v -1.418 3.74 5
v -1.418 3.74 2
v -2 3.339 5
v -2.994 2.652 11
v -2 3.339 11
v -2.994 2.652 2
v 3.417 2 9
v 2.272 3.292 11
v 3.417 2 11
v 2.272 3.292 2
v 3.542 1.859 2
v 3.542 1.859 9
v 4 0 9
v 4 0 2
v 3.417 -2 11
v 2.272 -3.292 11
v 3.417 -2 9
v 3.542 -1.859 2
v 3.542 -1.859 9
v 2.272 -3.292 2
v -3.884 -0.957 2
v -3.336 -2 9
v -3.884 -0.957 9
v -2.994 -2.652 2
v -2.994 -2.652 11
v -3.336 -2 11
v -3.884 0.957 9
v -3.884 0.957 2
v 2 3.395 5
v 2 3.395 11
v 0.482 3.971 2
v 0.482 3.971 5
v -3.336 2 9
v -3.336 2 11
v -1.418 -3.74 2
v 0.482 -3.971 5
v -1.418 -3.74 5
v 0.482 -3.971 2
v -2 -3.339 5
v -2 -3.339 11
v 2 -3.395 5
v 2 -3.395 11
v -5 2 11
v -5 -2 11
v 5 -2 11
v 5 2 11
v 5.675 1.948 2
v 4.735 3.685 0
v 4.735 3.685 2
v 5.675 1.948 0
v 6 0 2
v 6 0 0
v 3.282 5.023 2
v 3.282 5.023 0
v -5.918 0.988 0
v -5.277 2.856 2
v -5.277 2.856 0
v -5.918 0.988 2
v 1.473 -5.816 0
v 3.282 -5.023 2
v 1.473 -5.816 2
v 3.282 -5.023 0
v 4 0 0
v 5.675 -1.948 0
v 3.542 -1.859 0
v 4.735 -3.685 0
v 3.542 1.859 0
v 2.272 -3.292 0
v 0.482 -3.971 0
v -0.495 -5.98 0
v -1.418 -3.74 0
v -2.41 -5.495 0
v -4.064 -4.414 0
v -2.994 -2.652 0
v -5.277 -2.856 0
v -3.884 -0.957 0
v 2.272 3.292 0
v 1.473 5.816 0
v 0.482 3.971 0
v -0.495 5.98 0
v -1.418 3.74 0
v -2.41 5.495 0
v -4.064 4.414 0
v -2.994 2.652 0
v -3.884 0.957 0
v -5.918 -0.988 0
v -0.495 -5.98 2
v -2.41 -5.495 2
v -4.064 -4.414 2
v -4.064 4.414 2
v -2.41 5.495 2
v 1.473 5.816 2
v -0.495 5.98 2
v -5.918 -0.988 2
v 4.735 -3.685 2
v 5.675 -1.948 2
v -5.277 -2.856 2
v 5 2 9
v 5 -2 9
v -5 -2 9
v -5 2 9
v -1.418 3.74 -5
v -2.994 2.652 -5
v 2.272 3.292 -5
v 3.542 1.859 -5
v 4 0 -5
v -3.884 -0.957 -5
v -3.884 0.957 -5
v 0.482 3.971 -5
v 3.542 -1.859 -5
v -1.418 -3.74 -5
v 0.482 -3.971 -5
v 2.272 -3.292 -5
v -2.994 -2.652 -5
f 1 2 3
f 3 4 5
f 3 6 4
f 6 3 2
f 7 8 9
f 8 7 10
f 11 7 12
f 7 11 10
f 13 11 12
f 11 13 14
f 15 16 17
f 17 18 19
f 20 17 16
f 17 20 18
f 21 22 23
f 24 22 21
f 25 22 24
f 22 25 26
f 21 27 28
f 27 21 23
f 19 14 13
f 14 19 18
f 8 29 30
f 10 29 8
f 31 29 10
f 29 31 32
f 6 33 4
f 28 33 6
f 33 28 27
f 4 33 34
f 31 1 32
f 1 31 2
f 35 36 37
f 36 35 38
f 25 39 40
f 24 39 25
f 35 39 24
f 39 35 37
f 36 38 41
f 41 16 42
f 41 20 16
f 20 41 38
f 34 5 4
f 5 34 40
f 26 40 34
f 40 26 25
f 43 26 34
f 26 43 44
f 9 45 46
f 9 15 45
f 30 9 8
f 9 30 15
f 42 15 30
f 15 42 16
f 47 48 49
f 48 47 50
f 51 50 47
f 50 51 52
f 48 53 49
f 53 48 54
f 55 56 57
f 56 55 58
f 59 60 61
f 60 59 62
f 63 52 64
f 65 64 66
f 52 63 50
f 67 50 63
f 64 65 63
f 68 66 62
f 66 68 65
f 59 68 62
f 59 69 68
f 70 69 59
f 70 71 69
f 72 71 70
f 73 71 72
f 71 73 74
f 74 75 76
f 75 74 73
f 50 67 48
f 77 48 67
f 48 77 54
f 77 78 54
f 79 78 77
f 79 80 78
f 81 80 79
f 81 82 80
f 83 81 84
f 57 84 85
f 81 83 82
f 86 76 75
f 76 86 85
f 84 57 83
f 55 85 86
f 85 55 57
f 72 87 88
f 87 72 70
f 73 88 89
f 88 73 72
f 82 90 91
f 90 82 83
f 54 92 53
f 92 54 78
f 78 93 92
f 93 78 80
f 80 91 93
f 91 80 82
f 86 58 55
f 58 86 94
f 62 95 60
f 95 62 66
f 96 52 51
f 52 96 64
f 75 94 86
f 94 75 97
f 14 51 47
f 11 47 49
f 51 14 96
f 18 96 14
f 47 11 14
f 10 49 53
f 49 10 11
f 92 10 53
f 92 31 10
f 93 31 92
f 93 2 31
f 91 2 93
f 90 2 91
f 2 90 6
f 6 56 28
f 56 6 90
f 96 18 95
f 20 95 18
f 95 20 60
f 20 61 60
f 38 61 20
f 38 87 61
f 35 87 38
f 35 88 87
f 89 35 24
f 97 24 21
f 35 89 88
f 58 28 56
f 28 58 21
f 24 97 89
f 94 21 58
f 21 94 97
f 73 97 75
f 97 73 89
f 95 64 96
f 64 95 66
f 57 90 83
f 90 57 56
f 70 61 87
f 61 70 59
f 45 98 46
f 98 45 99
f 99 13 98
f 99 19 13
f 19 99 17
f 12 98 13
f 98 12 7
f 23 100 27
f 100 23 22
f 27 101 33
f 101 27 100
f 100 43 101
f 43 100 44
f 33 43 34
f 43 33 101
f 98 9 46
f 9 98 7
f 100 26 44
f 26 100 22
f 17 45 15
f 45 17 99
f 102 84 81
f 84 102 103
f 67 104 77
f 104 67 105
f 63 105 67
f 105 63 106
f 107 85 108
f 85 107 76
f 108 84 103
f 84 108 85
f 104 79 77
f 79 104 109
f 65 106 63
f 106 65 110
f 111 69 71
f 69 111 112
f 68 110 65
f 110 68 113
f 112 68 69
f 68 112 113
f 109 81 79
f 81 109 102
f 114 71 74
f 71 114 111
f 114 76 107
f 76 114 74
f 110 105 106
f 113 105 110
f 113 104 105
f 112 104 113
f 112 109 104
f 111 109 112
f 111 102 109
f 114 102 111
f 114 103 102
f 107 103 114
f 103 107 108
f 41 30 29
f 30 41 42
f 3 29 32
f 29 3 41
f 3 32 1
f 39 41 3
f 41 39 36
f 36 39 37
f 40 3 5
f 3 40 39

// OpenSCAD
difference() {
	union() {
		cylinder(r=4,h=11);
		cylinder(r=6,h=2);
		translate([-5,-2,9])cube([10,4,2]);
		translate([0,0,-5])cylinder(r=4,h=5);
	}
	translate([-2,-4,5])cube([4,8,6]);
}
